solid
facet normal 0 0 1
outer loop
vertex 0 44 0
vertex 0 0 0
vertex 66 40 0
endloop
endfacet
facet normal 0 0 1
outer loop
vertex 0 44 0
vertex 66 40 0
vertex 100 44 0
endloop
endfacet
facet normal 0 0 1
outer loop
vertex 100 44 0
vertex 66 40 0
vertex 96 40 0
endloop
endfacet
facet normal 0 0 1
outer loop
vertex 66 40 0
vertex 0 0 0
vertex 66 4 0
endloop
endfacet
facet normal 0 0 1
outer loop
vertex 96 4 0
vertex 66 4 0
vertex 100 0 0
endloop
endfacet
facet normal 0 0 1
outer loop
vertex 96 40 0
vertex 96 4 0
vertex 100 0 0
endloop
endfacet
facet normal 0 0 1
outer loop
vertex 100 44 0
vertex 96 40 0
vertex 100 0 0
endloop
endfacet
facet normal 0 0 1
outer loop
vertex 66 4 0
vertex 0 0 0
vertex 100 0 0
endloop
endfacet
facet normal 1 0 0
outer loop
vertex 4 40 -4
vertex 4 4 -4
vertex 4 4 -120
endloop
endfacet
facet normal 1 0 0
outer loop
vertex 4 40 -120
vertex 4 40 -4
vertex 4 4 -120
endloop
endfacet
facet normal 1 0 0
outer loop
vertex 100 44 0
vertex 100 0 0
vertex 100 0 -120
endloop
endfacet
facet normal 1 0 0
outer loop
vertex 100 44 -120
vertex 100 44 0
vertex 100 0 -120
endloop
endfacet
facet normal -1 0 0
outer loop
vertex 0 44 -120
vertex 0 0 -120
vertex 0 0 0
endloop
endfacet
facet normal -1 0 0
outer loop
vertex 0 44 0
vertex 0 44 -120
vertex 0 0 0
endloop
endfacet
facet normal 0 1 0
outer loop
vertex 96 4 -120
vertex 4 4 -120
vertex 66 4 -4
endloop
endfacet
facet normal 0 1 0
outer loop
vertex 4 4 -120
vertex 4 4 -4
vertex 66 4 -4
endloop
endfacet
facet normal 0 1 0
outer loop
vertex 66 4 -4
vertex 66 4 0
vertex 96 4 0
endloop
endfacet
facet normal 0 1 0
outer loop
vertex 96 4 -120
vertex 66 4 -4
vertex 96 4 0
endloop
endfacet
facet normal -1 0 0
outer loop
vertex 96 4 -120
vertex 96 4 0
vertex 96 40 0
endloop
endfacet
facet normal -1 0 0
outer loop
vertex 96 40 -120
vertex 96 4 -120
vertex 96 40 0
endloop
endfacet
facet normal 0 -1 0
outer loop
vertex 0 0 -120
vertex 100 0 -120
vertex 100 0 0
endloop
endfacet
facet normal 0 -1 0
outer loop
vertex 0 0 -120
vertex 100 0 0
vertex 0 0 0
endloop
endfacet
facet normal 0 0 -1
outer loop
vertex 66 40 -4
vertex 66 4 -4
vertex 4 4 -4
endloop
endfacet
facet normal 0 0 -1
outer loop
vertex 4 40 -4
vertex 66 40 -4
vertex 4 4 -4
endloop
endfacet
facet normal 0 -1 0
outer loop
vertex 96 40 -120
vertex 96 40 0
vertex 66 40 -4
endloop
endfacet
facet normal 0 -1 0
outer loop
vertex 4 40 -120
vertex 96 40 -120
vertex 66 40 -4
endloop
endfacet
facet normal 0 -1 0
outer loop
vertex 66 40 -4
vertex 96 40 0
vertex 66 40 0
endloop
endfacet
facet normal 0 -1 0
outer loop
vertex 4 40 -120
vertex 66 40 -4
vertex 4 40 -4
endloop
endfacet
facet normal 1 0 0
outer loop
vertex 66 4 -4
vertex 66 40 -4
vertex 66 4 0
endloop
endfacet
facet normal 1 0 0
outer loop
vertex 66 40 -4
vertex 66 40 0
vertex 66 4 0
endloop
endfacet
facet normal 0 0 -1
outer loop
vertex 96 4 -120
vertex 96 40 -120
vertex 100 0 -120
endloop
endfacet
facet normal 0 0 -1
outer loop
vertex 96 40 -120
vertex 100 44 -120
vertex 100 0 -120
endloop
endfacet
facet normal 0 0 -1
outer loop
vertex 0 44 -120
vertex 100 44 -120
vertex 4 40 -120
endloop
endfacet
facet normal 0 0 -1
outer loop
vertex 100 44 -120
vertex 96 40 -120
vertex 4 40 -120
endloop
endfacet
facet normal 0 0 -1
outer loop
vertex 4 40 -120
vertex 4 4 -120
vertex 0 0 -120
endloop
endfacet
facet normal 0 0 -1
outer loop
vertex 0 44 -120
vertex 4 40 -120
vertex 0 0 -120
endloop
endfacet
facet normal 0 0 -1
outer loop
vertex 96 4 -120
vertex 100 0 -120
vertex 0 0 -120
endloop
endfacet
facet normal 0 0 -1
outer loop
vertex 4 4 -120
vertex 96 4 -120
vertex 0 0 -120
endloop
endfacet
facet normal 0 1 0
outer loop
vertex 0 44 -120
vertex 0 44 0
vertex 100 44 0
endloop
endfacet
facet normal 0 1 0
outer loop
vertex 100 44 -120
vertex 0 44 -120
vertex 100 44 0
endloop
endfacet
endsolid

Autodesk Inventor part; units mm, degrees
ref_plane "YZ Plane" through (0, 0, 0) normal (1, 0, 0) x (0, 1, 0)
ref_plane "XZ Plane" through (0, 0, 0) normal (0, 1, 0) x (-1, 0, 0)
ref_plane "XY Plane" through (0, 0, 0) normal (0, 0, 1) x (1, 0, 0)
sketch "Skizze1" plane through (0, 0, 0) normal (0, 1, 0) x (-1, 0, 0)
  line L0 (0, 0) -> (-100, 0)
  line L1 (-100, 0) -> (-100, -120)
  line L2 (-100, -120) -> (0, -120)
  line L3 (0, -120) -> (0, 0)
  dimension "d0" = 100
  dimension "d1" = 120
extrude "Extrusion1" add sketch "Skizze1" along normal blind 4
sketch "Skizze2" plane through (0, 0, 0) normal (0, -1, 0) x (1, 0, 0)
  line L0 (100, 0) -> (100, -120) projected
  line L1 (100, -120) -> (0, -120) projected
  line L2 (0, -120) -> (0, 0) projected
  line L3 (0, 0) -> (100, 0) projected
  line L4 (4, -116) -> (96, -116)
  line L5 (96, -116) -> (96, -4)
  line L6 (96, -4) -> (4, -4)
  line L7 (4, -4) -> (4, -116)
  line L8 (4, -116) -> (4, -120)
  line L9 (96, -116) -> (96, -120)
  dimension "d4" = 4
extrude "Extrusion2" add sketch "Skizze2" against normal blind 40 contours L0 L1 L9 L5 L6 L7 L8 L2 L3
sketch "Skizze3" plane through (0, 40, 0) normal (0, 1, 0) x (1, 0, 0)
  line L0 (100, 120) -> (0, 120) projected
  line L1 (100, 0) -> (100, 120) projected
  line L2 (0, 0) -> (100, 0) projected
  line L3 (0, 120) -> (0, 0) projected
extrude "Extrusion3" add sketch "Skizze3" along normal blind 4
sketch "Skizze4" plane through (0, 0, 0) normal (0, 0, 1) x (1, 0, 0)
  line L0 (4, 4) -> (96, 4) construction
  line L1 (4, 4) -> (4, 40) construction
  line L2 (96, 40) -> (4, 40) construction
  line L3 (96, 4) -> (96, 40) construction
  line L4 (96, 40) -> (66, 40)
  line L5 (66, 40) -> (66, 4)
  line L6 (66, 4) -> (96, 4)
  line L7 (96, 4) -> (96, 40)
  point P0 (0, 0)
  dimension "d9" = 30
extrude "Extrusion4" cut sketch "Skizze4" against normal blind 4
properties part number "Schutzbox technik"
